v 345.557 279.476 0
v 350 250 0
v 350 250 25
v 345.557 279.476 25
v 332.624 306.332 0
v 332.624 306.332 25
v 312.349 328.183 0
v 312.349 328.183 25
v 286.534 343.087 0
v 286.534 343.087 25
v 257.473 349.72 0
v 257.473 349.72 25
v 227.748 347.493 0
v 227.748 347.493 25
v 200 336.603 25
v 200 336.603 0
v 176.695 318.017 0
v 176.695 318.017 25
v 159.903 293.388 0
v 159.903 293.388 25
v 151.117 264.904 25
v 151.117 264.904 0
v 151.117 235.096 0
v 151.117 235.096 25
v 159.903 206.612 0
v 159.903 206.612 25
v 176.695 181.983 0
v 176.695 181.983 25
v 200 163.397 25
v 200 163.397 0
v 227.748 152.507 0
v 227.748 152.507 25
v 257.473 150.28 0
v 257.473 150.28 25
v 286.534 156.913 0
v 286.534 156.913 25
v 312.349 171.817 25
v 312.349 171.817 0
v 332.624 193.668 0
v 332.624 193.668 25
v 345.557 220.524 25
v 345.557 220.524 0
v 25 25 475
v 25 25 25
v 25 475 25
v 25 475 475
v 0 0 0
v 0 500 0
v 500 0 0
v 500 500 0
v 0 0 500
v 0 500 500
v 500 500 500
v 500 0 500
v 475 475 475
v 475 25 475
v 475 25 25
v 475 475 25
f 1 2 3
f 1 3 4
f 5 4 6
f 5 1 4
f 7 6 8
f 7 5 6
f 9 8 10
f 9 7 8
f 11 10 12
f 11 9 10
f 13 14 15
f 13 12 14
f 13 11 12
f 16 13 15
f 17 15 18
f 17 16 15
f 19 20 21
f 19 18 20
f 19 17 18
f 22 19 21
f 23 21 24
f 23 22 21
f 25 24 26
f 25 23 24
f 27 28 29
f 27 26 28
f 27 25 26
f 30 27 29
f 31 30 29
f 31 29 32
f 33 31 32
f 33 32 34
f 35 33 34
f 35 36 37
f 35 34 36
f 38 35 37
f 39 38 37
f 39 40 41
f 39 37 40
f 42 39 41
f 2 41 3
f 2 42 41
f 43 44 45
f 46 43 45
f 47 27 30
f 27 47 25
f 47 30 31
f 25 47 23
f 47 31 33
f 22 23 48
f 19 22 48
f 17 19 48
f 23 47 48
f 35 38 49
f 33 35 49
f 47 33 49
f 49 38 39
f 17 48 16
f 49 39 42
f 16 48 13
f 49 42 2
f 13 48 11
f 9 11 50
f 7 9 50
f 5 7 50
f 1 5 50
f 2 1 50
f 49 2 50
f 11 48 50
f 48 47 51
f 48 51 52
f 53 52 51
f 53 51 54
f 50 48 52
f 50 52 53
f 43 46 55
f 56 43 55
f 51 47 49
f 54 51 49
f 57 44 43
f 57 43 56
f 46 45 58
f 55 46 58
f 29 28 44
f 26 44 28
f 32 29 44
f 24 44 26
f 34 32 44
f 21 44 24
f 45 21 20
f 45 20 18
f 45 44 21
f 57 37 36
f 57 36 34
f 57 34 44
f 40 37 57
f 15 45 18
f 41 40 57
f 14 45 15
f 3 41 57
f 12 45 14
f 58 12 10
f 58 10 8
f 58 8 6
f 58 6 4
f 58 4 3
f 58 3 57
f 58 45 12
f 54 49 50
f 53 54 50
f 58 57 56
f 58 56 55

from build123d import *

# Parameters (mm, degrees)
CYLINDER_R     = 100
CYLINDER_DEPTH = 50
BOX001_W       = 450
BOX001_H       = 450
BOX001_DEPTH   = 450
BOX013_W       = 500
BOX013_H       = 500
BOX013_DEPTH   = 500


with BuildPart() as cylinder:
    # Cylinder → Cylinder (new body)
    with BuildSketch(Plane(origin=(250, 250, -10), x_dir=(1, 0, 0), z_dir=(0, 0, 1))):
        Circle(CYLINDER_R)
    extrude(amount=CYLINDER_DEPTH)


with BuildPart() as cube001:
    # Box001 → Box001 (new body)
    with BuildSketch(Plane(origin=(25, 25, 25), x_dir=(1, 0, 0), z_dir=(0, 0, 1))):
        with Locations((225, 225)):
            Rectangle(BOX001_W, BOX001_H)
    extrude(amount=BOX001_DEPTH)


with BuildPart() as vacuumchamber:
    # Box013 → Box013 (new body)
    with BuildSketch(Plane.XY):
        with Locations((250, 250)):
            Rectangle(BOX013_W, BOX013_H)
    extrude(amount=BOX013_DEPTH)

    # Cut006: cut Cube001
    add(cube001.part, mode=Mode.SUBTRACT)

    # Cut001: cut Cylinder
    add(cylinder.part, mode=Mode.SUBTRACT)


solid = vacuumchamber.part
